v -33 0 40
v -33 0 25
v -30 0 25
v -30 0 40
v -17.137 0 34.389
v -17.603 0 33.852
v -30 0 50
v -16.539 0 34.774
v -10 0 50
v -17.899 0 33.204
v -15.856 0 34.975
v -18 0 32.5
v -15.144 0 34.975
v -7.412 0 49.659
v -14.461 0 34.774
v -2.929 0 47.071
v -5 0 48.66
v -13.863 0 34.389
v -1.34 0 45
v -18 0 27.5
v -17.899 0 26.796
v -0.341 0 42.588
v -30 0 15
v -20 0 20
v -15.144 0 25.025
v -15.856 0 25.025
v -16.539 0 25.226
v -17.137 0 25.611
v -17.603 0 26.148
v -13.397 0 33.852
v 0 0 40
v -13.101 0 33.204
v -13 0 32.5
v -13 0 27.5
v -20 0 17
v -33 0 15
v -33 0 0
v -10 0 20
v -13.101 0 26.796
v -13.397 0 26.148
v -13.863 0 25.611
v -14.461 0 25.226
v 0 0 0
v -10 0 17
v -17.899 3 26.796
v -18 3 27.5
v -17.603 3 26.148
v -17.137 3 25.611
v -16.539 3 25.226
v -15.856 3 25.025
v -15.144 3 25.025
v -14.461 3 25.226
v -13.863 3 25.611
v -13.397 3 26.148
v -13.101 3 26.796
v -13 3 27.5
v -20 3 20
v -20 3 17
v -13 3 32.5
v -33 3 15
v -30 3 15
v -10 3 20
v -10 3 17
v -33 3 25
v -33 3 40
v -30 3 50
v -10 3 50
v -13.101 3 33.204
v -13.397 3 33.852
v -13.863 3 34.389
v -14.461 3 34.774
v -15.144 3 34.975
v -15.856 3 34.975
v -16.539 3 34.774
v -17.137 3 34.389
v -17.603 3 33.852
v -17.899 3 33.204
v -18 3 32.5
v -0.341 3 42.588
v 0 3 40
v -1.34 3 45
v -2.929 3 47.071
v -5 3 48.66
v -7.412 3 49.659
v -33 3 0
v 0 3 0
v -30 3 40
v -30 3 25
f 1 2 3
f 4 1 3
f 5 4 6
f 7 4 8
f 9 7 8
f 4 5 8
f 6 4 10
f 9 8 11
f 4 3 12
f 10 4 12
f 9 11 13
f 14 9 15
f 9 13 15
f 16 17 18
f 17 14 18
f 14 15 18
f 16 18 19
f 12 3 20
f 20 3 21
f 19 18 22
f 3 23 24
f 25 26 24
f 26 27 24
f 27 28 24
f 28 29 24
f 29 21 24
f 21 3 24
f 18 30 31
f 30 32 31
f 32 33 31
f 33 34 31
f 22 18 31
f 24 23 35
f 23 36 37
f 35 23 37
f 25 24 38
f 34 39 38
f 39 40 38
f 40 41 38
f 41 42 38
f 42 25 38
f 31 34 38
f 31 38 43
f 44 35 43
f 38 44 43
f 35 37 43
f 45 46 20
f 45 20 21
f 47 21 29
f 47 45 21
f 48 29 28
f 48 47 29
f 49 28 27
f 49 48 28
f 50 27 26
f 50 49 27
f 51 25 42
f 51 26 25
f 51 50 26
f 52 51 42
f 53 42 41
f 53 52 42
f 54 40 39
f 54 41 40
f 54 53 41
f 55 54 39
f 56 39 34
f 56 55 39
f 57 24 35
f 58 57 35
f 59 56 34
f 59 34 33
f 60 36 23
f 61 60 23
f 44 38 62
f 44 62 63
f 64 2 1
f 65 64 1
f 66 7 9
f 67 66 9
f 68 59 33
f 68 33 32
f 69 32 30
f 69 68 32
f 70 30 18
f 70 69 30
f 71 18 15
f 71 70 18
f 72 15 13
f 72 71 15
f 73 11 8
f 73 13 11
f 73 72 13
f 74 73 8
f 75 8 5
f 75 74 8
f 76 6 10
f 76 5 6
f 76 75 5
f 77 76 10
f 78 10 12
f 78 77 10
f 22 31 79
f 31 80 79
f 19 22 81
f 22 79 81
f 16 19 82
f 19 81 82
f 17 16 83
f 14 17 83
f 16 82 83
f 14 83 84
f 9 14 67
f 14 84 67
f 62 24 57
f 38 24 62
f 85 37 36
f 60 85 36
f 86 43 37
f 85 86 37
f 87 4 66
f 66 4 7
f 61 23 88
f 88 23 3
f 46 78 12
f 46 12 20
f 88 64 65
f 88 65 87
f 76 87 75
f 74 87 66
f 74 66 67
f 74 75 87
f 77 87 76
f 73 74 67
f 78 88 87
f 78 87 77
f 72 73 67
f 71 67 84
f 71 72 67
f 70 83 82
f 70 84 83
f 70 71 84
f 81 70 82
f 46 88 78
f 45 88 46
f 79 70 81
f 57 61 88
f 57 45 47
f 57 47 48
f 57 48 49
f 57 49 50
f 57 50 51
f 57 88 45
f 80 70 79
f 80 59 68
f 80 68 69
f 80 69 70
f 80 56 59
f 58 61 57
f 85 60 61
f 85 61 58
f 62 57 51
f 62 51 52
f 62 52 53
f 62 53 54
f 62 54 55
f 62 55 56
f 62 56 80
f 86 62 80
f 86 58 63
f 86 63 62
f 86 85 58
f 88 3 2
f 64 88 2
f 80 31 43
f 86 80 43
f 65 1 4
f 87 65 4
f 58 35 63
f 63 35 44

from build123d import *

# Parameters (mm, degrees)
SKETCH1_W           = 10
SKETCH1_H           = 3
BOSS_EXTRUDE1_DEPTH = 3
CUT_EXTRUDE1_DEPTH  = 60.983331018
FILLET1_R           = 10


with BuildPart() as part:
    # Sketch1 → Boss-Extrude1 (new body)
    with BuildSketch(Plane(origin=(0, 0, 0), x_dir=(1, 0, 0), z_dir=(0, 1, 0))):
        Polygon((-33, 0), (-33, -15), (-30, -15), (-30, -25), (-33, -25), (-33, -40), (-30, -40), (-30, -50), (0, -50), (0, 0), align=None)
        with Locations((-15, -18.5)):
            Rectangle(SKETCH1_W, SKETCH1_H, mode=Mode.SUBTRACT)
    extrude(amount=BOSS_EXTRUDE1_DEPTH)

    # Sketch2 → Cut-Extrude1 (cut, through all)
    with BuildSketch(Plane(origin=(0, 3, 0), x_dir=(1, 0, 0), z_dir=(0, 1, 0))):
        with BuildLine():
            Line((-18, -32.5), (-18, -27.5))
            ThreePointArc((-18, -27.5), (-15.5, -25), (-13, -27.5))
            Line((-13, -27.5), (-13, -32.5))
            ThreePointArc((-13, -32.5), (-15.5, -35), (-18, -32.5))
        make_face()
    extrude(amount=-CUT_EXTRUDE1_DEPTH, mode=Mode.SUBTRACT)

    # Fillet1
    fillet1_edges = [part.edges().sort_by_distance(p)[0] for p in [
        (0, 1.5, 50),
    ]]
    fillet(fillet1_edges, radius=FILLET1_R)


solid = part.part
